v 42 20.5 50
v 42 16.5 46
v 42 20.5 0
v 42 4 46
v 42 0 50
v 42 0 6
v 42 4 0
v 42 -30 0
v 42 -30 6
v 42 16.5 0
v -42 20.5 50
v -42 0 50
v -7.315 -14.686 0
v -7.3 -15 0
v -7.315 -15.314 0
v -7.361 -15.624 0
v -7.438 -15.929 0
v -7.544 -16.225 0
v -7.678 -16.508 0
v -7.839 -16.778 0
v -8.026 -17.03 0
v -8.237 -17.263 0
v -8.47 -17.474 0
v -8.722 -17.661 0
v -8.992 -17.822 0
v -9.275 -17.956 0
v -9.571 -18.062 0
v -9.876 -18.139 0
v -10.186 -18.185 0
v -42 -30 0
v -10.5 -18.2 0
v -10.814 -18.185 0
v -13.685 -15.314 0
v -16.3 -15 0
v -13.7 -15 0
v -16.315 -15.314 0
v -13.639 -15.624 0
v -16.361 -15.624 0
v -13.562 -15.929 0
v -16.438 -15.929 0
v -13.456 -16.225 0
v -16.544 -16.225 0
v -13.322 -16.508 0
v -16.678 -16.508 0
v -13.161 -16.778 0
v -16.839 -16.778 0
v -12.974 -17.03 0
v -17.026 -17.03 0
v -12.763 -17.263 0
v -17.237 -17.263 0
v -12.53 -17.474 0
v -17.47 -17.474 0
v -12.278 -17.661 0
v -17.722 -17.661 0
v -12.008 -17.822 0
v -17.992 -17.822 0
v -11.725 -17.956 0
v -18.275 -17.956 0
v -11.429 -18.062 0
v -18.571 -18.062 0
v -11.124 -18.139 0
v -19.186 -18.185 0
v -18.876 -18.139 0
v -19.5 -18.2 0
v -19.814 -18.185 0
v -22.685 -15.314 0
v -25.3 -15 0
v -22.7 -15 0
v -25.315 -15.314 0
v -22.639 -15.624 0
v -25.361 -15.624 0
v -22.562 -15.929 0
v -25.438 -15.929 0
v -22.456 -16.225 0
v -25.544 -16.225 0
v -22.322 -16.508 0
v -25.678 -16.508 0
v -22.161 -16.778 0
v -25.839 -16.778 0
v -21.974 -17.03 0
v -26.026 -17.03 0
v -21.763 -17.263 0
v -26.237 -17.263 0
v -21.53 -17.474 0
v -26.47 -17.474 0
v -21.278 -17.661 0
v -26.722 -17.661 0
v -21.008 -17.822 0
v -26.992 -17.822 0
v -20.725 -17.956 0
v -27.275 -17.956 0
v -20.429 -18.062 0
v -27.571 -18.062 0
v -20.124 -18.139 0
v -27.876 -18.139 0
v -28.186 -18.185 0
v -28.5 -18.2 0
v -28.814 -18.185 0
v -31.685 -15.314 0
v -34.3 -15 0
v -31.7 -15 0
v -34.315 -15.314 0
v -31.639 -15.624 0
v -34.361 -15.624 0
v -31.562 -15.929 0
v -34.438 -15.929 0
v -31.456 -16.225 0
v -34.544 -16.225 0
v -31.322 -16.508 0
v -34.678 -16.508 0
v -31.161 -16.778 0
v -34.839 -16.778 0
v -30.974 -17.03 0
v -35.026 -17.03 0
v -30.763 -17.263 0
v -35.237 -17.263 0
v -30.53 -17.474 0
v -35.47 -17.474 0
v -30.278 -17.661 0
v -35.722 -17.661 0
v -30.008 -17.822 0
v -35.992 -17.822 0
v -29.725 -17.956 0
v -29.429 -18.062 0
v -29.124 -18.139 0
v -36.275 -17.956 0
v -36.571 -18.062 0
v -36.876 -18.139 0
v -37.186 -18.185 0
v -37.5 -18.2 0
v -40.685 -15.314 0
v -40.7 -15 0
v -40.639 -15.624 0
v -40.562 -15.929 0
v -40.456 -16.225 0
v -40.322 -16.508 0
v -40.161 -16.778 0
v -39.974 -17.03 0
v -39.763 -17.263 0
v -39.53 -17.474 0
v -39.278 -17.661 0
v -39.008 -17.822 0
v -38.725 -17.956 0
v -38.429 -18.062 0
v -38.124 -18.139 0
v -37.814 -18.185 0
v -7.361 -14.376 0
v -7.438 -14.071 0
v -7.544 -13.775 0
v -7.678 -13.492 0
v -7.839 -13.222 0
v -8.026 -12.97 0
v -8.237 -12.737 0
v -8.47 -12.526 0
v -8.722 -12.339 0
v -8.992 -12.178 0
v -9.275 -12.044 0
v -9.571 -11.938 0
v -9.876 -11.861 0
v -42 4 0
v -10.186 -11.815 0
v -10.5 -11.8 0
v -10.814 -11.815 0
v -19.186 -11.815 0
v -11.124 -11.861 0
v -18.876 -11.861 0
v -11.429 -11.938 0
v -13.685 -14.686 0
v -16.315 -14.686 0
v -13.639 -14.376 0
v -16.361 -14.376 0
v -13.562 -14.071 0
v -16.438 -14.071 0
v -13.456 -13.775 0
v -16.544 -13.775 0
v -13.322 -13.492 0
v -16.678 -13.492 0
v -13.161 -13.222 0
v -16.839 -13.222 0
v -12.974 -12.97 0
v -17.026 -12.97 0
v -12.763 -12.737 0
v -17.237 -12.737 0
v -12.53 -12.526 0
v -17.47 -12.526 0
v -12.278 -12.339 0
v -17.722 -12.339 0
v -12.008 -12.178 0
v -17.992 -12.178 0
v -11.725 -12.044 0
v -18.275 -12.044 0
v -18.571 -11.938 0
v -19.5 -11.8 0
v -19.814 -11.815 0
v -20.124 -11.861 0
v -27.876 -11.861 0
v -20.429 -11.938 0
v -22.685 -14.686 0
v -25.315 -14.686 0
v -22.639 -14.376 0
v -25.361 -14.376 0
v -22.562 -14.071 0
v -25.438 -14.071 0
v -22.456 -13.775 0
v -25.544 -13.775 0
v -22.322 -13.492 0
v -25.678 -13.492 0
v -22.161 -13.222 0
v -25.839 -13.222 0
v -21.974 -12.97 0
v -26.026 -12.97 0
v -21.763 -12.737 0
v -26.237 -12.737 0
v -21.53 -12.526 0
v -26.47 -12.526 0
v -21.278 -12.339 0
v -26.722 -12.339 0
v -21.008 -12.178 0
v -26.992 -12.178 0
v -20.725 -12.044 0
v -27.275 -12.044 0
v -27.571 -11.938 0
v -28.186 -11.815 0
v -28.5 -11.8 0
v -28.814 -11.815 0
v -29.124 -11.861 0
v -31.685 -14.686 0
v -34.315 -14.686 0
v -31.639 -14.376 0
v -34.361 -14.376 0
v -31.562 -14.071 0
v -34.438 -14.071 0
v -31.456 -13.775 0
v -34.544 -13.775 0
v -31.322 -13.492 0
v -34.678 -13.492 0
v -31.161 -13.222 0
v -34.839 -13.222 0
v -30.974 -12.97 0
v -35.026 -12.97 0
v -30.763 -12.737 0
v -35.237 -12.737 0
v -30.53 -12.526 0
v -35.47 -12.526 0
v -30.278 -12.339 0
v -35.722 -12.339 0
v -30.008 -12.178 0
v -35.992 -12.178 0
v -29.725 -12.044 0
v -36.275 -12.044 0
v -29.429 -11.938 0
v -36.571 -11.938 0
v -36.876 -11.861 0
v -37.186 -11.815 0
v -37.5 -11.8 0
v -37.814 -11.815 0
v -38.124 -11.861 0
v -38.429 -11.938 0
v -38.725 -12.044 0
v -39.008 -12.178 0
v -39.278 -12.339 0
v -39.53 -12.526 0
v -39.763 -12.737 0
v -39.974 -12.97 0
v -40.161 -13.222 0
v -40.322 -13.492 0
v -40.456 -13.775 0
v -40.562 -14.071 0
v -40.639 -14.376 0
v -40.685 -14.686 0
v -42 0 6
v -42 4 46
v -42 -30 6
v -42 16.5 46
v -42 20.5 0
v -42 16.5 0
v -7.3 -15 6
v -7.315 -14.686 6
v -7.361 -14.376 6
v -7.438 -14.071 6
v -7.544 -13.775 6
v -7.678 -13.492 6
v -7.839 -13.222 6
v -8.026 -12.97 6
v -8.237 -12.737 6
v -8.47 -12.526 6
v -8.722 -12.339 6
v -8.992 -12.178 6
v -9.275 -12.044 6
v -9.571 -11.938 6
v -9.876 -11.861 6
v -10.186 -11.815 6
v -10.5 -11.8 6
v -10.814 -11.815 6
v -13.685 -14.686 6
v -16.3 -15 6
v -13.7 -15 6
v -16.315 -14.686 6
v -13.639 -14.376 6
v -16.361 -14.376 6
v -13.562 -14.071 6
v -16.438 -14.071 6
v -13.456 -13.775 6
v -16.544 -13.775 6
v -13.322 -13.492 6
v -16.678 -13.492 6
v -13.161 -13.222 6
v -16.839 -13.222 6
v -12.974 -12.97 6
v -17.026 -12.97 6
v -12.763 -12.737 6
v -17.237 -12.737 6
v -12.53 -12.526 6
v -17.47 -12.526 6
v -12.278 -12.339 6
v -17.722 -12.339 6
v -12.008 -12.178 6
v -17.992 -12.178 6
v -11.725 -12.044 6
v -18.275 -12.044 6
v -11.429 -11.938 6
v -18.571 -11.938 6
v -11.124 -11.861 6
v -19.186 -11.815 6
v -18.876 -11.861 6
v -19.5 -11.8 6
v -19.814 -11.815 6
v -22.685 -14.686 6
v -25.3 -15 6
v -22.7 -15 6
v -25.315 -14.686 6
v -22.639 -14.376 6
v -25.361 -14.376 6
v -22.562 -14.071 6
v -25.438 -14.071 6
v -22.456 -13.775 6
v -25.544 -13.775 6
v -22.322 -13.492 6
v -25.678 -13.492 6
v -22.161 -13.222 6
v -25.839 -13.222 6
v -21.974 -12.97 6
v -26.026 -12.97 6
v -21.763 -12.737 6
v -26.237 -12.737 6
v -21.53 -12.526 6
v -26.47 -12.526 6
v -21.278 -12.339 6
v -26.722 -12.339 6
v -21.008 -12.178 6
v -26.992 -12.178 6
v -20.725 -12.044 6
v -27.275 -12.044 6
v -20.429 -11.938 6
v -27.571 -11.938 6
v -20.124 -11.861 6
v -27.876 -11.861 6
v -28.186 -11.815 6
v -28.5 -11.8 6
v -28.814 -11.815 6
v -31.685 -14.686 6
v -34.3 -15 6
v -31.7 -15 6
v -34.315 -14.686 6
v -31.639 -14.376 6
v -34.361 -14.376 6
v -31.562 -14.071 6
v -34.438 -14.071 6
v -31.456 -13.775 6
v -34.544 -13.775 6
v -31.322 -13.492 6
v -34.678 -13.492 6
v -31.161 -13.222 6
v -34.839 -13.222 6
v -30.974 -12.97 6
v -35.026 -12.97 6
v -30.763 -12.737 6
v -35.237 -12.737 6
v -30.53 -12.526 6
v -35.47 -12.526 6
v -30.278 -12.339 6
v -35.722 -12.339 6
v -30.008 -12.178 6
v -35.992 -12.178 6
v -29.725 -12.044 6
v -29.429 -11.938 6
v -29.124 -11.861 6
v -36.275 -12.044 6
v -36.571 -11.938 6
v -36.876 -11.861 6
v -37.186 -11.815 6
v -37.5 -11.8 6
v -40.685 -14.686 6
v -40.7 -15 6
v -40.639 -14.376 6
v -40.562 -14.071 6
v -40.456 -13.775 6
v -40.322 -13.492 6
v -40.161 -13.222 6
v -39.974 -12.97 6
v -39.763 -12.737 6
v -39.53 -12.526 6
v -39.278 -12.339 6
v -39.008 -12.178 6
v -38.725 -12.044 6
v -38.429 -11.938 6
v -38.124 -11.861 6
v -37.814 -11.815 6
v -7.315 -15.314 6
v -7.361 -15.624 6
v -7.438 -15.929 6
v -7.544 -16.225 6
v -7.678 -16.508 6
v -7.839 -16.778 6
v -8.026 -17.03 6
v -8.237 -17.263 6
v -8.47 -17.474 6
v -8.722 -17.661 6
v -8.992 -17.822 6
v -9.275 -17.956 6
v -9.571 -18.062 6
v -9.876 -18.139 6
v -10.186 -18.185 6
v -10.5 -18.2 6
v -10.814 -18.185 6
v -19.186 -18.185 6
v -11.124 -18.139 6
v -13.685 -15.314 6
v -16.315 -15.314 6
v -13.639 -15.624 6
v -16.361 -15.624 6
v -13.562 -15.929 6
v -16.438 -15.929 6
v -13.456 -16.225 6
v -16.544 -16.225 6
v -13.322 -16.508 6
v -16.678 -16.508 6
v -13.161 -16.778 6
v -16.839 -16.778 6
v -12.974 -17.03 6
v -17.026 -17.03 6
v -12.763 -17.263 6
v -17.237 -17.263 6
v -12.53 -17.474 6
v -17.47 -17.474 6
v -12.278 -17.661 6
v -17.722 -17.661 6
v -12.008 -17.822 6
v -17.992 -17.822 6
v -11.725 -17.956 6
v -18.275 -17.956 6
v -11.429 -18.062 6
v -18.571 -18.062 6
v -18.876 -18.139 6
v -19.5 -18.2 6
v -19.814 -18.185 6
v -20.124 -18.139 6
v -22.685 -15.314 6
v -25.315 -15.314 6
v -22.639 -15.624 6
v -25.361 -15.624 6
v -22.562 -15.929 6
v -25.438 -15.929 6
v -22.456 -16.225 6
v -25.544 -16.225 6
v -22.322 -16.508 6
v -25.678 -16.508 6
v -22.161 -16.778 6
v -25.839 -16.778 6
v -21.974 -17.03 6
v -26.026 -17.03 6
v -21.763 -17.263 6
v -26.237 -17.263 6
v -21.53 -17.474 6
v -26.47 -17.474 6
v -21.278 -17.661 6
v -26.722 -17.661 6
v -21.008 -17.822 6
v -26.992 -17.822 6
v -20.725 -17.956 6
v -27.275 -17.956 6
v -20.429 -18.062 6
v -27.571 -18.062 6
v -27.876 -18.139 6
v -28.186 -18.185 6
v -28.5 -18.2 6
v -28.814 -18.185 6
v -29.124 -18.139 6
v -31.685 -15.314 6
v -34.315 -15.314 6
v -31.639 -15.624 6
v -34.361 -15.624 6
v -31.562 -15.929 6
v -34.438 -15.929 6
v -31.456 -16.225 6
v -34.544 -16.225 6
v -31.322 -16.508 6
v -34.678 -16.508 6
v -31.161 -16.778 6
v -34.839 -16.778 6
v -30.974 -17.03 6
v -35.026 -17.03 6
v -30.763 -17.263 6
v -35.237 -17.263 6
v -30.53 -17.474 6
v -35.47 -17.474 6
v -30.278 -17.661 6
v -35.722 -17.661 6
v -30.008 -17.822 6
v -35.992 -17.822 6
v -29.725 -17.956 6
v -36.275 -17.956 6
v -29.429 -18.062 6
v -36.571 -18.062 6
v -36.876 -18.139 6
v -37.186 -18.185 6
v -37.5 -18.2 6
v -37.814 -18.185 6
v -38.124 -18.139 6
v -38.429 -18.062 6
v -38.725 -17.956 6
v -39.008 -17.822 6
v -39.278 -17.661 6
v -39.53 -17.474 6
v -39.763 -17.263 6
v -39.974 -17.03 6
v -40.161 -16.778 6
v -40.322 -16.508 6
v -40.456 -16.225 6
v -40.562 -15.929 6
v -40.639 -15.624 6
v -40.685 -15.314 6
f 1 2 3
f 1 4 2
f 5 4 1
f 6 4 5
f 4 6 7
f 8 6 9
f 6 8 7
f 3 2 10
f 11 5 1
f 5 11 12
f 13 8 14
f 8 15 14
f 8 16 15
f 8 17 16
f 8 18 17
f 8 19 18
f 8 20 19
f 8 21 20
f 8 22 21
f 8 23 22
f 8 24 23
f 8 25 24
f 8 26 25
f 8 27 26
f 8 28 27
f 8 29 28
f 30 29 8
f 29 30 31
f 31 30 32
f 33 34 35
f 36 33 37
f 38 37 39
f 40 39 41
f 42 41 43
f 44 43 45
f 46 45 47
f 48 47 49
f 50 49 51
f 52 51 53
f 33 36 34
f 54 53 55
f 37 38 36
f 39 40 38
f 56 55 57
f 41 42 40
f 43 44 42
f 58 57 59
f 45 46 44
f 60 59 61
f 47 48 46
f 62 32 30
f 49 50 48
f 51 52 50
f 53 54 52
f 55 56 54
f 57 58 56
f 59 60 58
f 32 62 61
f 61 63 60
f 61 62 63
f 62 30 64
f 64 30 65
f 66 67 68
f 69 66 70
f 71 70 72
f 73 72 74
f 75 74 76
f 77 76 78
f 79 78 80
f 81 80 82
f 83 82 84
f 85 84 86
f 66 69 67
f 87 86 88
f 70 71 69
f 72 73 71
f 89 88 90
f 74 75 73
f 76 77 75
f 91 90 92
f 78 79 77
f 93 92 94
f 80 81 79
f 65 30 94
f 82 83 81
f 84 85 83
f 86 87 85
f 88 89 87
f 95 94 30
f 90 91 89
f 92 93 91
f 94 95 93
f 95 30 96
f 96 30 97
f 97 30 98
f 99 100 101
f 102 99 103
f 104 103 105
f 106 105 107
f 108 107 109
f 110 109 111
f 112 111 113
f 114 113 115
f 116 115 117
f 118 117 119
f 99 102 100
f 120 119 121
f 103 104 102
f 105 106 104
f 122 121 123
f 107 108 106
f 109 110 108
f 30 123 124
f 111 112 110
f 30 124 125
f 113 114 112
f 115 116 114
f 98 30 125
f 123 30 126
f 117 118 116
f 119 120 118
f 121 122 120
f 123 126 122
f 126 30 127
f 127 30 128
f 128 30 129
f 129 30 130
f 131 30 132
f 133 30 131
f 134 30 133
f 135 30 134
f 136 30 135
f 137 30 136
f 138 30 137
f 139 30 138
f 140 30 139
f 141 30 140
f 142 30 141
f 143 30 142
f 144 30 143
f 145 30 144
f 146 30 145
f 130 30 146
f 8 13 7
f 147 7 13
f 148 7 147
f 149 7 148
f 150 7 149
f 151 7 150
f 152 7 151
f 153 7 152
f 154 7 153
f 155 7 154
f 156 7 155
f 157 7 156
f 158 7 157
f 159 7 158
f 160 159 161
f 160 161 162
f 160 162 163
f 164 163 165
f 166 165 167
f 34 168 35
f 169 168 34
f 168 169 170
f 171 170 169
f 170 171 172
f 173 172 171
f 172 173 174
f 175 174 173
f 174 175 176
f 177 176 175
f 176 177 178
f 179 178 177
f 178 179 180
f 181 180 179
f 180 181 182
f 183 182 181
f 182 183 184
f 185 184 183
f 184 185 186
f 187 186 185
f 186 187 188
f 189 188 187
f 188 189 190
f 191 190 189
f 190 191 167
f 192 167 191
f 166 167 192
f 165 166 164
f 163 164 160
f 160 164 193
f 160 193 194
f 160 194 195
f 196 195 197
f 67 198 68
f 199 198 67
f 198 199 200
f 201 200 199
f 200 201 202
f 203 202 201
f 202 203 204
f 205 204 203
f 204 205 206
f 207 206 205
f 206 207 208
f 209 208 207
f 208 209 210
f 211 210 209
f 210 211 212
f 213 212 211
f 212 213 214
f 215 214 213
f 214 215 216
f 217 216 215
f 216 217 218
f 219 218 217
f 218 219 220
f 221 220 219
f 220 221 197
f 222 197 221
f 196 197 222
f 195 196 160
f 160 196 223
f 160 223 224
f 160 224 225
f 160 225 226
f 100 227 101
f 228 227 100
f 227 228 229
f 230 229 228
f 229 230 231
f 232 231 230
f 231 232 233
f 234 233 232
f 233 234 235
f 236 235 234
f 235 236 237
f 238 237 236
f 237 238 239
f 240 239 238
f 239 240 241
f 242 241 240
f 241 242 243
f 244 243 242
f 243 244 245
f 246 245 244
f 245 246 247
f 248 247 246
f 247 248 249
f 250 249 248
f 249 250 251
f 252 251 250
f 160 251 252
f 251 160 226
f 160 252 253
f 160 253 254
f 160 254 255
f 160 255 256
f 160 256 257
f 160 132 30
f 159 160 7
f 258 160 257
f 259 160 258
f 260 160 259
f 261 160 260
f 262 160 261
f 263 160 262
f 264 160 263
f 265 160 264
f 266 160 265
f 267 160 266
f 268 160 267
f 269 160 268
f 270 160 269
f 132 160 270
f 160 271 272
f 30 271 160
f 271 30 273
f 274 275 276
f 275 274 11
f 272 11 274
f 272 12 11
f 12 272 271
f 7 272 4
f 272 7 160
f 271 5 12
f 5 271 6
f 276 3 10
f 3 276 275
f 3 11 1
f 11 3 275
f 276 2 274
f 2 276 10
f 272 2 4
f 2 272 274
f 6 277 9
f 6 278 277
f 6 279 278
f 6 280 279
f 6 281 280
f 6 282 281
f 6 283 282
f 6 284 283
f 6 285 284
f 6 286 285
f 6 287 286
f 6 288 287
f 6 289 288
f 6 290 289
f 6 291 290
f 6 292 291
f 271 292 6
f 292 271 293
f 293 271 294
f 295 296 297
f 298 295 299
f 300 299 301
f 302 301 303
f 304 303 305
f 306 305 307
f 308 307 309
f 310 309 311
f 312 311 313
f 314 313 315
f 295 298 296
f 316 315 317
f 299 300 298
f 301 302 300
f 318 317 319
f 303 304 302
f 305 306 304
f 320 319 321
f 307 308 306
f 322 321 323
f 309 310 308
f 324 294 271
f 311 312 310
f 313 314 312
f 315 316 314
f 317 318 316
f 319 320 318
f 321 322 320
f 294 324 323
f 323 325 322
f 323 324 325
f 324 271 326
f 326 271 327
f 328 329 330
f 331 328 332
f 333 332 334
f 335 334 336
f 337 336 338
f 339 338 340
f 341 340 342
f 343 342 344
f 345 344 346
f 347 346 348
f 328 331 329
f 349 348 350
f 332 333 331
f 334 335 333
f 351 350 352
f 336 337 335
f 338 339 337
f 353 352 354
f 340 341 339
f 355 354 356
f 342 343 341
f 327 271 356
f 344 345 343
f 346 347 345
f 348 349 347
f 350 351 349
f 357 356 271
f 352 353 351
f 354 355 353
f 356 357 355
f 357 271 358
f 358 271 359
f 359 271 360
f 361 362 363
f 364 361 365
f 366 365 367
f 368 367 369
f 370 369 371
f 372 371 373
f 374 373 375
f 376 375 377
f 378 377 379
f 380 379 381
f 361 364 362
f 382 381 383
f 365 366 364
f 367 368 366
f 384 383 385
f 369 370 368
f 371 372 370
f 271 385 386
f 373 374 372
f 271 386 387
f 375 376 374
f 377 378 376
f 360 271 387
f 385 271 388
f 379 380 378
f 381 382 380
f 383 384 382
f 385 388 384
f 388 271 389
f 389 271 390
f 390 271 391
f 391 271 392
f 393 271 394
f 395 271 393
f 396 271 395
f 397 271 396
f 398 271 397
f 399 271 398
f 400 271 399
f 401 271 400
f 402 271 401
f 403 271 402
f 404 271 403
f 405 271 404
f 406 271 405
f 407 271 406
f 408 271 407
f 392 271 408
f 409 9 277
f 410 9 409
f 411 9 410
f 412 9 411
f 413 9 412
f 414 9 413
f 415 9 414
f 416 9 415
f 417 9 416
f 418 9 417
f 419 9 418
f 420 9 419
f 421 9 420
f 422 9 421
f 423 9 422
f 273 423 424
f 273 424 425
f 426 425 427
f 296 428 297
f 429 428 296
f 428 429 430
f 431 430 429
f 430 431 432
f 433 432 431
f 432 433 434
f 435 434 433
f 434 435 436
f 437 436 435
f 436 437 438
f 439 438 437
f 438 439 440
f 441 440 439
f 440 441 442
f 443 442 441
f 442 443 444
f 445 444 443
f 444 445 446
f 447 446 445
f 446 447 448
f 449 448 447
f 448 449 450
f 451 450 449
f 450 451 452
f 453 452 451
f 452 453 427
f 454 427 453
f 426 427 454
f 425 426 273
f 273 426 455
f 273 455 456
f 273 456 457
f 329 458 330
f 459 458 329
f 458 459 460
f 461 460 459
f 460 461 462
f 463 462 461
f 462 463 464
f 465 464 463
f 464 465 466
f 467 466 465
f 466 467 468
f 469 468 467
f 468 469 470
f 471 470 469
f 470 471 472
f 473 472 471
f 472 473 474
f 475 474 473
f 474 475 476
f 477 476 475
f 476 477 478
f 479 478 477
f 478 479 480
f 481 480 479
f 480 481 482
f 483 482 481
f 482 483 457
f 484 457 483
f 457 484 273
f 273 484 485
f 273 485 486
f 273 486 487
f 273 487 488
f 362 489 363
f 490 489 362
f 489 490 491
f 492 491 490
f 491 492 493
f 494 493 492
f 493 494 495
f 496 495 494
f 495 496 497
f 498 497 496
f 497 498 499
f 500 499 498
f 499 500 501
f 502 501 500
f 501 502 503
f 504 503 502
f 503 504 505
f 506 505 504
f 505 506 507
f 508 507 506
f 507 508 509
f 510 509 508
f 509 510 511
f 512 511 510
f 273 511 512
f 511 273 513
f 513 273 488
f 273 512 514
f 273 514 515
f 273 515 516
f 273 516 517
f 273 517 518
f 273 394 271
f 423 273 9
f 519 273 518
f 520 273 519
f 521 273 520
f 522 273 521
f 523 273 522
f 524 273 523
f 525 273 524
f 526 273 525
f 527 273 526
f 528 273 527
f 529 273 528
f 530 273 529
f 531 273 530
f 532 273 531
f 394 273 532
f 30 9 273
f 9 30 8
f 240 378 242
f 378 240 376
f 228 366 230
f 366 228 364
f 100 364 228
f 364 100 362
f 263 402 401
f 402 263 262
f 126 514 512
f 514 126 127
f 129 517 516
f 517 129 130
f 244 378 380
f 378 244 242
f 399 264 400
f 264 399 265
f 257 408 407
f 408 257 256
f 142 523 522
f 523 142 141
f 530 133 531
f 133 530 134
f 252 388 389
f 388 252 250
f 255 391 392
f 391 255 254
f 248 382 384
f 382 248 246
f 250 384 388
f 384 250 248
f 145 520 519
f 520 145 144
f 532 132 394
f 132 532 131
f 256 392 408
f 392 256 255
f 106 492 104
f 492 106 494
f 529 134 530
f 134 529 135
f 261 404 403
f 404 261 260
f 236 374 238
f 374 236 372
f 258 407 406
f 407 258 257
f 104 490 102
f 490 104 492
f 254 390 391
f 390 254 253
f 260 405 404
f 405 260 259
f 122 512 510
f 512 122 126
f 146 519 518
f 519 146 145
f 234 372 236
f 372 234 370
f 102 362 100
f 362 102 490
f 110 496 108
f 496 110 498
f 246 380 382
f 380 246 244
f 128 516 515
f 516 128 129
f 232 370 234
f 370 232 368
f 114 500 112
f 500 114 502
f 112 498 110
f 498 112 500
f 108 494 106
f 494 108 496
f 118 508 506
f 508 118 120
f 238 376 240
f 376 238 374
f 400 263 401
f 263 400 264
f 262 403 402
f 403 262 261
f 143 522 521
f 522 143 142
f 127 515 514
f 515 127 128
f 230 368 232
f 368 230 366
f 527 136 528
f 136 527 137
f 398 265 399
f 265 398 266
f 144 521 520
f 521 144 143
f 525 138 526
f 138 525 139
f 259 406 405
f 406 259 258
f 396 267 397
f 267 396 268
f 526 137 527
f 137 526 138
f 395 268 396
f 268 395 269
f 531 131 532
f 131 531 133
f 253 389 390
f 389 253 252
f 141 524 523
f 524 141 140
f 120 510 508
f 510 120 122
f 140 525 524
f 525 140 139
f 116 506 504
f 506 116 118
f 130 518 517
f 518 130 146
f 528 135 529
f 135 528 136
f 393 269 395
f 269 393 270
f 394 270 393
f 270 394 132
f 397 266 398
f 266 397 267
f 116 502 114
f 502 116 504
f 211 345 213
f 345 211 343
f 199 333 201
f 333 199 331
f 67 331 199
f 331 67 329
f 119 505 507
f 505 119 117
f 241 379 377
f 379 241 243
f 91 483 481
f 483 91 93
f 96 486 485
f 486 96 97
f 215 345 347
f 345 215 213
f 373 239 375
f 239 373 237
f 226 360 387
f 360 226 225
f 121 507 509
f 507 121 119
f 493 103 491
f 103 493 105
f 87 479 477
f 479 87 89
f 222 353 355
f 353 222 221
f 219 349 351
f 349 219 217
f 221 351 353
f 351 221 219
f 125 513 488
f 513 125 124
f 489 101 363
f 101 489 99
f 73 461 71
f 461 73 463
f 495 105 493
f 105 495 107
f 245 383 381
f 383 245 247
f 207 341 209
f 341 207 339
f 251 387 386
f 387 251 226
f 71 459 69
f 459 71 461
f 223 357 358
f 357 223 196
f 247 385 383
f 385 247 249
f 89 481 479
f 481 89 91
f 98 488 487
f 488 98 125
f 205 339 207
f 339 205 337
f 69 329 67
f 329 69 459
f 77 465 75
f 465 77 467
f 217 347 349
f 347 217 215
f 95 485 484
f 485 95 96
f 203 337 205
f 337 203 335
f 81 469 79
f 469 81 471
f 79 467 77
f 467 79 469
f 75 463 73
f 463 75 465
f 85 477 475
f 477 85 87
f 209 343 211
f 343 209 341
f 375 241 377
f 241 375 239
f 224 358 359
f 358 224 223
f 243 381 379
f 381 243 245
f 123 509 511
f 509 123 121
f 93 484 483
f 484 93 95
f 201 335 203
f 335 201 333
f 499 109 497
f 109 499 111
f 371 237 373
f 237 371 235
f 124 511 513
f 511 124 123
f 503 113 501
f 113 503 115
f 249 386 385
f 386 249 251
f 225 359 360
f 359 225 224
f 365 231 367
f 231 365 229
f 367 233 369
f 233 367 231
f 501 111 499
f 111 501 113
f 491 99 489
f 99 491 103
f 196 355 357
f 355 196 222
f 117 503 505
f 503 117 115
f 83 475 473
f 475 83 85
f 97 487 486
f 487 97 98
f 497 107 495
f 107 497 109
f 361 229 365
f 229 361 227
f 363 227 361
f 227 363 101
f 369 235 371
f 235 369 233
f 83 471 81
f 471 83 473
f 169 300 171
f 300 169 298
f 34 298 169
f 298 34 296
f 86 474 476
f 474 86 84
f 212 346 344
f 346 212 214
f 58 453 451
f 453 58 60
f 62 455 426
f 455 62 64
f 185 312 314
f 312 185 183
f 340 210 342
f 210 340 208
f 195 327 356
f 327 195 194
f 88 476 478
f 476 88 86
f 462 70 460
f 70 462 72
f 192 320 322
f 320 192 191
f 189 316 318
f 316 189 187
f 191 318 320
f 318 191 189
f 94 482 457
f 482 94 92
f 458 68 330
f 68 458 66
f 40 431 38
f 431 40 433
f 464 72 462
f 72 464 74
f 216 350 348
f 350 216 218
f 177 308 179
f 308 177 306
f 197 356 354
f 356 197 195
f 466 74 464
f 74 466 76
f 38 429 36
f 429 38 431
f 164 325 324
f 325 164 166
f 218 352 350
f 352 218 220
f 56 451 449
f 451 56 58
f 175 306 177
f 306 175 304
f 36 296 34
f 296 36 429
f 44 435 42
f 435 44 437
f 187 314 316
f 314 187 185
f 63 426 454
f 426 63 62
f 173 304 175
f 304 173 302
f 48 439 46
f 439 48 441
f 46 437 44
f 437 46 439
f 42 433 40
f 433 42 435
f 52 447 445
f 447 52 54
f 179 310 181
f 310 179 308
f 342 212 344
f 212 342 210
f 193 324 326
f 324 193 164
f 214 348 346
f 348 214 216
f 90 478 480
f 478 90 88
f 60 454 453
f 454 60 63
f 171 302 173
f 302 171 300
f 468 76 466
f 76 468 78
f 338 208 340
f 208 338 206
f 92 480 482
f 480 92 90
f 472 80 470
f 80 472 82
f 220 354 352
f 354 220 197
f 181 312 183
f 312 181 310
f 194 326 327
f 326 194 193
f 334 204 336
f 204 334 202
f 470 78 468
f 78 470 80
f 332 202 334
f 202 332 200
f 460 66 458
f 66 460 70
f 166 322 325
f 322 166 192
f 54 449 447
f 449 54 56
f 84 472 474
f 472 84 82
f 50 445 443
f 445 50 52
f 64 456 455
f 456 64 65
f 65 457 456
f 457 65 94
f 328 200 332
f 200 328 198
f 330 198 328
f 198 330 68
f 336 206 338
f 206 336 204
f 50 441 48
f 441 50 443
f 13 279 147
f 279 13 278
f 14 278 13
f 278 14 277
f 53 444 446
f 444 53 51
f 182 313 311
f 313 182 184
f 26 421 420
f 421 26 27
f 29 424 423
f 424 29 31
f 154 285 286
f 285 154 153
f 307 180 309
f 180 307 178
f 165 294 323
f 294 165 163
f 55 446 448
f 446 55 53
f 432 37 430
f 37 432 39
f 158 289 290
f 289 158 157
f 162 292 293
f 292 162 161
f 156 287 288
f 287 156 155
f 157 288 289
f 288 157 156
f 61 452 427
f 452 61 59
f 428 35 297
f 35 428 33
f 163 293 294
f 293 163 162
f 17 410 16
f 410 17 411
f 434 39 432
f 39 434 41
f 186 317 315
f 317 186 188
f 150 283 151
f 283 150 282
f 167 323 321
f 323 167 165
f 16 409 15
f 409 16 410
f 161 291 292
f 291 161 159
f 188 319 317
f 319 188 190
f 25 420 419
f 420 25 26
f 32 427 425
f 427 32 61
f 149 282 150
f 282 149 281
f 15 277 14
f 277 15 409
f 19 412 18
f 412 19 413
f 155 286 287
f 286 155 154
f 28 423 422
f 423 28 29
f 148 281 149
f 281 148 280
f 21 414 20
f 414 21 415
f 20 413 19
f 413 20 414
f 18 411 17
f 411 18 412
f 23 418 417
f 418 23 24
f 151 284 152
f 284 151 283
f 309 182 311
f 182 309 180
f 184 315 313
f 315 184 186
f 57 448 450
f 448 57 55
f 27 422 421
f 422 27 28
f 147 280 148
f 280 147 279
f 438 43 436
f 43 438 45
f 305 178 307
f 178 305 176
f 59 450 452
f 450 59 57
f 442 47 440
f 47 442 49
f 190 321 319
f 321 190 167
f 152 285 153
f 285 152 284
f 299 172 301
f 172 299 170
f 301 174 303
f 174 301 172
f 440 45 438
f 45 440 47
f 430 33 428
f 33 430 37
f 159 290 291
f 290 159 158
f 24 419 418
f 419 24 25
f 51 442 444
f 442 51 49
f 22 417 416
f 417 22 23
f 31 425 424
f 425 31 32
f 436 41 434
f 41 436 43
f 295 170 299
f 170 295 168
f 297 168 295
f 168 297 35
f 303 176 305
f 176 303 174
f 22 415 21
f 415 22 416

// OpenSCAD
// --- Dimensions ---
length_x = 84;             // Overall extrusion length along X
gap_width = 12.5;          // Gap for the 12mm wall (16.5 - 4 = 12.5)
leg_thickness = 4;         // Thickness of the legs (y=0 to 4 and y=16.5 to 20.5)
leg_height = 50;           // Height of the legs (z=0 to 50)
bridge_height_start = 46;  // Start of the top bridge (z=46)
bridge_height_end = 50;    // End of the top bridge (z=50)
ledge_thickness = 6;       // Thickness of the ledge (z=0 to 6)
ledge_depth = 30;          // Ledge extends from y=0 to y=-30
hole_diameter = 6.4;       // Diameter of PCR tube holes
hole_y_pos = -15;          // Y-coordinate of the holes
hole_spacing_x = 9;        // Spacing between holes along X
num_holes = 8;             // Number of holes

// --- Parameters ---
$fn = 64;

// --- Calculations ---
// Calculate X offset to center the 8 holes along the 84mm length
// Total span of holes = (num_holes - 1) * spacing
hole_span = (num_holes - 1) * hole_spacing_x;
x_start = -(hole_span / 2);

// --- Modeling ---

module part_geometry() {
    difference() {
        union() {
            // 1. Inner Leg: y = 0 to 4, z = 0 to 50
            // Extends along X from 0 to 84
            cube([length_x, leg_thickness, leg_height]);
            
            // 2. Outer Leg: y = 16.5 to 20.5, z = 0 to 50
            // Extends along X from 0 to 84
            translate([0, 16.5, 0])
                cube([length_x, 4, leg_height]);
            
            // 3. Top Bridge: z = 46 to 50, spanning the gap
            // Spans from y=0 to y=20.5 to connect the legs
            translate([0, 0, bridge_height_start])
                cube([length_x, 20.5, bridge_height_end - bridge_height_start]);
            
            // 4. Ledge: y = -30 to 0, z = 0 to 6
            // Extends along X from 0 to 84
            translate([0, -ledge_depth, 0])
                cube([length_x, ledge_depth, ledge_thickness]);
        }

        // 5. Vertical Holes: 6.4mm through-holes in the ledge
        // "Vertical" means along the Z axis.
        // "Through-holes" in the 6mm ledge means they cut from z=0 to z=6.
        // We use a small epsilon (0.01) to ensure the cut is clean.
        for (i = [0 : num_holes - 1]) {
            translate([x_start + (i * hole_spacing_x), hole_y_pos, -0.01])
                cylinder(d = hole_diameter, h = ledge_thickness + 0.02);
        }
    }
}

// Final Assembly:
// The part is centered on X=0.
// The geometry is built from X=0 to X=84, so we translate by -length_x/2.
// This places the center of the 84mm length at X=0.
translate([-length_x/2, 0, 0])
    part_geometry();
